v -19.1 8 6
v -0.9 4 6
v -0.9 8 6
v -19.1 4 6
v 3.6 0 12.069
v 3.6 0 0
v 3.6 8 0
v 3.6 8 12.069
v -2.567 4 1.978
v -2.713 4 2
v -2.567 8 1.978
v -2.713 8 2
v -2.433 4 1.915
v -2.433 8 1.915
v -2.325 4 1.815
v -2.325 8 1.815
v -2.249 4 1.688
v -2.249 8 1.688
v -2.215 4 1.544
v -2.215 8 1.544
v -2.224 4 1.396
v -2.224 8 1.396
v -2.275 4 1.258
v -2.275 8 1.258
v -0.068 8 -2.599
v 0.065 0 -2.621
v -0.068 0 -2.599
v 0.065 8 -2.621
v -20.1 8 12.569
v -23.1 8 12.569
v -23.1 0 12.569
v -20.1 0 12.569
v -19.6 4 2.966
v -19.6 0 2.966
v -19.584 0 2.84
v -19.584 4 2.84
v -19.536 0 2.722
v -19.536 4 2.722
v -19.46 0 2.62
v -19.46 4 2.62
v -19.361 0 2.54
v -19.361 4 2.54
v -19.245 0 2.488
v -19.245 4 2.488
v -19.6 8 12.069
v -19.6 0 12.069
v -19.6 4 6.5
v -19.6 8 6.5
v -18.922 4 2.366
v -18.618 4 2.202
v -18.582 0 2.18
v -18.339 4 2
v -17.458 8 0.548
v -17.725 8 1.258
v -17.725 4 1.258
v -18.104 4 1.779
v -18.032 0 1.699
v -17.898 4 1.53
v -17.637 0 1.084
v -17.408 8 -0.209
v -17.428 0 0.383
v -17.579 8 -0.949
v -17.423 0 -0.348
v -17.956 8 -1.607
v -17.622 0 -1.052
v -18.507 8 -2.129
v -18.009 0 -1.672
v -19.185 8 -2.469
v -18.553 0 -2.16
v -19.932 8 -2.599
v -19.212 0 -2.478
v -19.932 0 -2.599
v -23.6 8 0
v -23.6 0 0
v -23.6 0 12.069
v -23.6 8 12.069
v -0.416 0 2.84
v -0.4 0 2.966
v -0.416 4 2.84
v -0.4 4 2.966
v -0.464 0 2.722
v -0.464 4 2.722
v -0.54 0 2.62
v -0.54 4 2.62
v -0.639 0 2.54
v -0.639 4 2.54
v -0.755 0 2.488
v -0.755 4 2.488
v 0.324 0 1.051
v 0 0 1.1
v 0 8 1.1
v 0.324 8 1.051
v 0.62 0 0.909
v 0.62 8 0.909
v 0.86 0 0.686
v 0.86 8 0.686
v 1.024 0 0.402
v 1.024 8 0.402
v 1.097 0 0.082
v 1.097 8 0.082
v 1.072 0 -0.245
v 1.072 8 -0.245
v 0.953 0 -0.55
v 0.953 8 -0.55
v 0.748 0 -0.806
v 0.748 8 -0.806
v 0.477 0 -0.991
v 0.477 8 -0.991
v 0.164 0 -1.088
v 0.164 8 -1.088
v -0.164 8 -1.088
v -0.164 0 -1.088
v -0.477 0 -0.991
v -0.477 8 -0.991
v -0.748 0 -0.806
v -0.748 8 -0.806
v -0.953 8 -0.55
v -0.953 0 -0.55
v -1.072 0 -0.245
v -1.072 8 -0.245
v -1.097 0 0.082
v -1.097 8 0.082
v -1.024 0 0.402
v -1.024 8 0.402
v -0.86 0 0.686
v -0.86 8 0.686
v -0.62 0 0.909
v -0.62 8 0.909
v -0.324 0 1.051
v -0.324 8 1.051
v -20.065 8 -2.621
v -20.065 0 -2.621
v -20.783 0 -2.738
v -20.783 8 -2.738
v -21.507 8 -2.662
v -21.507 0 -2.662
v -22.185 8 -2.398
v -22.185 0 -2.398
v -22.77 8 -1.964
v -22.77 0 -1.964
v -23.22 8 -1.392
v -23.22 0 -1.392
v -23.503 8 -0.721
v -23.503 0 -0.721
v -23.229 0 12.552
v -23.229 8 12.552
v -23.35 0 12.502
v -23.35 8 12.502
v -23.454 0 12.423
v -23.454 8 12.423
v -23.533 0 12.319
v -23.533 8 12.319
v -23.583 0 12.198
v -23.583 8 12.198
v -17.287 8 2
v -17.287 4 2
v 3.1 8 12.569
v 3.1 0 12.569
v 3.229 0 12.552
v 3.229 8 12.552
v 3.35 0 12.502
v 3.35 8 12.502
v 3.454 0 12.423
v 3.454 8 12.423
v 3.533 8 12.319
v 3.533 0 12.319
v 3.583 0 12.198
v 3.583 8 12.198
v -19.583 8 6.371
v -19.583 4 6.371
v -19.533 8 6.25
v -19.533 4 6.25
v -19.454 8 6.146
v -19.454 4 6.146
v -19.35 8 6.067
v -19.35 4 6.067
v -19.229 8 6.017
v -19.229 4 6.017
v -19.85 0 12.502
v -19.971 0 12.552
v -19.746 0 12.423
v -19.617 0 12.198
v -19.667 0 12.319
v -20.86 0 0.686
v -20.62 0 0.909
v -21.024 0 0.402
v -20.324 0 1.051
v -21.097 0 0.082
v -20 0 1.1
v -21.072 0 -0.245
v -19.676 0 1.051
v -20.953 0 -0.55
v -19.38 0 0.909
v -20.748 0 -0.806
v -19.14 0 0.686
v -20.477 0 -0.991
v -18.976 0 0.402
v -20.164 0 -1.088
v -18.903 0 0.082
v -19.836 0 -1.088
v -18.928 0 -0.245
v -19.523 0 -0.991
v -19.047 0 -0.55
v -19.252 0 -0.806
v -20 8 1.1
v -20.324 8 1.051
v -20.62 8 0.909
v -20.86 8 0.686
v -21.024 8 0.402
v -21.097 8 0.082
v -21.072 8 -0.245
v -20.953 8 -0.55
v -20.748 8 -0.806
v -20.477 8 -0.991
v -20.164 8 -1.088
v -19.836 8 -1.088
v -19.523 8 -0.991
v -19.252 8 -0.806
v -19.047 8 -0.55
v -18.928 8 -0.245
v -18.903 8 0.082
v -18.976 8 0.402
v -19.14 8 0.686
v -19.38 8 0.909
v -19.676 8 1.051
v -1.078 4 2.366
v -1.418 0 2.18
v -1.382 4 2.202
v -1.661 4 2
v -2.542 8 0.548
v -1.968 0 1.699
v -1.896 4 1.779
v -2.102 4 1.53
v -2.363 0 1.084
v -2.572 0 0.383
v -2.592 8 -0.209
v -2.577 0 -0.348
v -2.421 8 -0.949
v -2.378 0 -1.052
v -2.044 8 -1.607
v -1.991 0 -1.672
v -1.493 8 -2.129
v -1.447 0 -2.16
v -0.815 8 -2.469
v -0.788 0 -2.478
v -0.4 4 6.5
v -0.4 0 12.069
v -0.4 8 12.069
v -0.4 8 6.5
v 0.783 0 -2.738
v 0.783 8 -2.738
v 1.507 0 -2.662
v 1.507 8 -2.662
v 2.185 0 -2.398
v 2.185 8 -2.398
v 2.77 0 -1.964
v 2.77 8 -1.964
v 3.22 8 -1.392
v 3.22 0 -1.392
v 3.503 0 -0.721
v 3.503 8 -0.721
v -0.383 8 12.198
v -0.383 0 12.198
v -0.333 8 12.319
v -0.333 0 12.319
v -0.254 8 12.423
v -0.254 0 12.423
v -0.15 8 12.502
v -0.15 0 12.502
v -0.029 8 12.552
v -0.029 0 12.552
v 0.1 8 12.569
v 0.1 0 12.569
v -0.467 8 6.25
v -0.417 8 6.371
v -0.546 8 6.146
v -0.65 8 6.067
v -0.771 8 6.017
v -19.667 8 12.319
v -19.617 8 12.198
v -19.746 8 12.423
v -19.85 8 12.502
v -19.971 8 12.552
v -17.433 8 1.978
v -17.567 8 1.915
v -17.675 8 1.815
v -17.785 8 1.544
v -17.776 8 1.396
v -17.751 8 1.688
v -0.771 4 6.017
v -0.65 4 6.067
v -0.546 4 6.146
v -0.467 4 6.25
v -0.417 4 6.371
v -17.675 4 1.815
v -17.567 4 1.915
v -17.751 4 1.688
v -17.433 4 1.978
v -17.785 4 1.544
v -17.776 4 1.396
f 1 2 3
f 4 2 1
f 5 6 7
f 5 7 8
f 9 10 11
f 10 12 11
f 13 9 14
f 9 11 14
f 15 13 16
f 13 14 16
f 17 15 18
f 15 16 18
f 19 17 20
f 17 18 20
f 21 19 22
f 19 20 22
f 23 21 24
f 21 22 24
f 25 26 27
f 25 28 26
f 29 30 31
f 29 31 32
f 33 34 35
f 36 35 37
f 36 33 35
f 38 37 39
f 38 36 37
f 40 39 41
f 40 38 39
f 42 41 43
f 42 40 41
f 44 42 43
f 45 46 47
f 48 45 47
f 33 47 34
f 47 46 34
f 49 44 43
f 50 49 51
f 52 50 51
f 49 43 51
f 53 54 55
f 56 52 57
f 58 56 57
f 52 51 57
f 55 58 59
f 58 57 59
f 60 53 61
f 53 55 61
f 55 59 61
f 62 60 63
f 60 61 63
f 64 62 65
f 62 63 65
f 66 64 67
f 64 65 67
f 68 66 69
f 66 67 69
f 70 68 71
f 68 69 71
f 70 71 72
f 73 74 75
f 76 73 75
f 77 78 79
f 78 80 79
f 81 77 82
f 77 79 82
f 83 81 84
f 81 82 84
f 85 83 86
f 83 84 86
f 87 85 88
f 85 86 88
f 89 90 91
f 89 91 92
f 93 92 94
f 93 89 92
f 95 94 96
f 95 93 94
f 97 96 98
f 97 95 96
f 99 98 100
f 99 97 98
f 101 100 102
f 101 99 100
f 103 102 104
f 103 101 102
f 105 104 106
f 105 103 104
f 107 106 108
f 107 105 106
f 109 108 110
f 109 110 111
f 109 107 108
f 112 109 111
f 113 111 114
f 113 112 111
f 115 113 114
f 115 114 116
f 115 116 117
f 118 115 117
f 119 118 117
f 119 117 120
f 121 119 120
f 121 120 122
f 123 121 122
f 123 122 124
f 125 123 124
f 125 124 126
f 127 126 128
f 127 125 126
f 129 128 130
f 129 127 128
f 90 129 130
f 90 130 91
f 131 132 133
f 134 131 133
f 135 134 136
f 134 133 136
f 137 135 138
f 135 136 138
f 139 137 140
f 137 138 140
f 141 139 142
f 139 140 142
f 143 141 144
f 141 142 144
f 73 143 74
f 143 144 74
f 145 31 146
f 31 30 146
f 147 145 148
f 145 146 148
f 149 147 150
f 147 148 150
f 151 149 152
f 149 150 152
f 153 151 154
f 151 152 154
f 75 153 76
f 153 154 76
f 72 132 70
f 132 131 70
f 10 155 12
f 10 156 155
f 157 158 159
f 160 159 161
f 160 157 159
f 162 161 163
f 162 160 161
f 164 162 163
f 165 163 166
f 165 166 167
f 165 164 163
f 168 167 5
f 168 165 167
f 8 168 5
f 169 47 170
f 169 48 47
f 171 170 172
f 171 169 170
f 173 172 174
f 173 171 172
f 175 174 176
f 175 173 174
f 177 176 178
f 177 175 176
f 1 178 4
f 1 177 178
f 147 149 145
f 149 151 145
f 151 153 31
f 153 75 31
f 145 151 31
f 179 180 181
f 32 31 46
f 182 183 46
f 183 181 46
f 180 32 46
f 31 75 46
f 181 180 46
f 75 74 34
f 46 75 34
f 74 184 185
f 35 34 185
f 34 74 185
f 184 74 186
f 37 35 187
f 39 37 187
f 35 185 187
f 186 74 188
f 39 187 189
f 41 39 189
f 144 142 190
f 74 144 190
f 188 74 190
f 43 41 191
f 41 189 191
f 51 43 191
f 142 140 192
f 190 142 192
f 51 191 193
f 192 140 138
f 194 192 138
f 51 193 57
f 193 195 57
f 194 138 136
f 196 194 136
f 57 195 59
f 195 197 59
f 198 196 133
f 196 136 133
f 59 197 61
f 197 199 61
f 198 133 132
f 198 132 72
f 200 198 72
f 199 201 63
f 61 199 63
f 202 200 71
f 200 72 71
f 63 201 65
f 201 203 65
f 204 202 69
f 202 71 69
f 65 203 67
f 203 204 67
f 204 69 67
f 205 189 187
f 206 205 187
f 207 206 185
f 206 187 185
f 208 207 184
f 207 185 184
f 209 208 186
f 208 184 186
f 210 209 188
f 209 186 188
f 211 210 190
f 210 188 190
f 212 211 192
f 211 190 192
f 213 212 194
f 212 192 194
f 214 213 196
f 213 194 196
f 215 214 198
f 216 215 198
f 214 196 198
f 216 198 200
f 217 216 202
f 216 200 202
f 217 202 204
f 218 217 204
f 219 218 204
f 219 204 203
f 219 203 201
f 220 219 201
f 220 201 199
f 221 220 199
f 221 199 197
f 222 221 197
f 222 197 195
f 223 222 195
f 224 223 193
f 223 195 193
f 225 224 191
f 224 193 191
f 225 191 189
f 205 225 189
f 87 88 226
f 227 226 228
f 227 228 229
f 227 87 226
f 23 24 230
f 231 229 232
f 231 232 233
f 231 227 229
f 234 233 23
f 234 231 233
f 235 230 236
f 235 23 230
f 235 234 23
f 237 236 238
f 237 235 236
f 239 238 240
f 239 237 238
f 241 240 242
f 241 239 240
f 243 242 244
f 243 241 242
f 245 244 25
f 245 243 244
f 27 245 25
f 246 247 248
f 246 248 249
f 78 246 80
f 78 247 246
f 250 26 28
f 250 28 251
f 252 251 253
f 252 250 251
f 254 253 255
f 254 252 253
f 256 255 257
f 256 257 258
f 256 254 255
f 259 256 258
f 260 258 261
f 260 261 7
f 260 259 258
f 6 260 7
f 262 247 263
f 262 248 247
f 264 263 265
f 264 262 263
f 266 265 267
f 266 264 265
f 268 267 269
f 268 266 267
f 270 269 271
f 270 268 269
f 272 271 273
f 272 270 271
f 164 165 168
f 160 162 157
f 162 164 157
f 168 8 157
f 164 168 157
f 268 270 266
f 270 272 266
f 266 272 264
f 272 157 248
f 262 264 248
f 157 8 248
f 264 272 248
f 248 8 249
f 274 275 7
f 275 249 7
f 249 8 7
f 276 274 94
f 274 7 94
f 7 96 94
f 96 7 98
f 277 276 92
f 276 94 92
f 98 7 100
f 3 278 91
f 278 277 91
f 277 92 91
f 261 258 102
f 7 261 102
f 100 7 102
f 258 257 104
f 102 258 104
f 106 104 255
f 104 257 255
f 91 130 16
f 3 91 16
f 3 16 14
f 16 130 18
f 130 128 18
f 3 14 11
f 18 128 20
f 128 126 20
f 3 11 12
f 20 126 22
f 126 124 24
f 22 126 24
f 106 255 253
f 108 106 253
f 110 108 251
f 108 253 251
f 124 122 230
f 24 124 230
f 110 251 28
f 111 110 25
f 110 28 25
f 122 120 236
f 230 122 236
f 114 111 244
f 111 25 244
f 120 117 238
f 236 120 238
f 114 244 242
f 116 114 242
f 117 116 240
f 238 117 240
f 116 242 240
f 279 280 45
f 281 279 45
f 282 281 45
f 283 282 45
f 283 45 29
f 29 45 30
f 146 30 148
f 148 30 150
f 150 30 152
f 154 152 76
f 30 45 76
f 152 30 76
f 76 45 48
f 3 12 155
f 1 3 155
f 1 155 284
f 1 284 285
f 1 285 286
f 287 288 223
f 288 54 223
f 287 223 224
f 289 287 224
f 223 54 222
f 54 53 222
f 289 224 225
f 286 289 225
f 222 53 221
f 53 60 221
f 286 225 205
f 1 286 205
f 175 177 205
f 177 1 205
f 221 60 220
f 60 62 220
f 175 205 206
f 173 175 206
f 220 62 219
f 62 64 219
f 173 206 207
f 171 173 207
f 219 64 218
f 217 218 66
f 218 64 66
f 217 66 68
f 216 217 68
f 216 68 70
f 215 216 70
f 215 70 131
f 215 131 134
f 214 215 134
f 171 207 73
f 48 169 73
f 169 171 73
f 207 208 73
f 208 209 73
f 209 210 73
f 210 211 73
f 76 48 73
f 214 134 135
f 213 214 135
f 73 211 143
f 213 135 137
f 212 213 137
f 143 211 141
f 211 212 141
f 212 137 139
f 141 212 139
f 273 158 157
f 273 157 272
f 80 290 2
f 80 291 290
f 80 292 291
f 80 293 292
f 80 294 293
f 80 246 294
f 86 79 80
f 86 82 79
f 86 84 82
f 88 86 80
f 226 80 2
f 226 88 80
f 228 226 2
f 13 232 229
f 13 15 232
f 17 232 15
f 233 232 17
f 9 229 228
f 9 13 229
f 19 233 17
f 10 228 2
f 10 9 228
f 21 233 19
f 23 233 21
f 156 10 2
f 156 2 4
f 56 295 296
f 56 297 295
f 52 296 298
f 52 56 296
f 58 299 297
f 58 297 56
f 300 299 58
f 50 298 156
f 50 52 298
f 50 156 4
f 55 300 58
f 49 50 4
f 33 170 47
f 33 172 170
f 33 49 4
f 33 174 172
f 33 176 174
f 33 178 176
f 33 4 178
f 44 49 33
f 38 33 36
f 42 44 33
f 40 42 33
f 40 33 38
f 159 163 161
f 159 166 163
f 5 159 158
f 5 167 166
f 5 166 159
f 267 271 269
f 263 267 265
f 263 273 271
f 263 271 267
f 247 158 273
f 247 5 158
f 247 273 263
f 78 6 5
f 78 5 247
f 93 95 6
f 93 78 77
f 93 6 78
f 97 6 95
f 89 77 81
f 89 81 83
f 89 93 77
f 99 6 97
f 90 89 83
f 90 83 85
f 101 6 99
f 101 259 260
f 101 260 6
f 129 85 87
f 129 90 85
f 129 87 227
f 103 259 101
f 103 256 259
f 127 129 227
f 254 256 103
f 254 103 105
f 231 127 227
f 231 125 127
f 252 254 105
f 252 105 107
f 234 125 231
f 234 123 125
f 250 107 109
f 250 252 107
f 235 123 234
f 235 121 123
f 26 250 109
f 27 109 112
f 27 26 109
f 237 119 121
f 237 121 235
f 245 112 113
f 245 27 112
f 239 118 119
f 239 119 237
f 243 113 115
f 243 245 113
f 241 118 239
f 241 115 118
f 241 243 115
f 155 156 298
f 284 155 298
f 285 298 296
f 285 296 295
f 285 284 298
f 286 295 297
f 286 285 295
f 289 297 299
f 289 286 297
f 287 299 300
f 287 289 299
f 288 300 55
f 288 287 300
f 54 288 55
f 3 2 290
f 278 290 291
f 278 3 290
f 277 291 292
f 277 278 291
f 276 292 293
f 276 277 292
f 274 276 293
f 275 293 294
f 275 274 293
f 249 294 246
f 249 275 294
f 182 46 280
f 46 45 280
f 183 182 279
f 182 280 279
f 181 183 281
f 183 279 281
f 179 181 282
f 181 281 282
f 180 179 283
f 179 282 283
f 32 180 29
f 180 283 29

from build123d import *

# Parameters (mm, degrees)
SKETCH1_R           = 1.1
BASE_DEPTH          = 8
BOSS_EXTRUDE2_START = -4
BOSS_EXTRUDE2_DEPTH = 4
FILLET1_R           = 0.5


with BuildPart() as part:
    # Sketch1 → Base (new body)
    with BuildSketch(Plane(origin=(0, 0, 0), x_dir=(1, 0, 0), z_dir=(0, 1, 0))):
        with BuildLine():
            Line((3.6, 0), (3.6, -12.569046516))
            Line((3.6, -12.569046516), (-0.4, -12.569046516))
            Line((-0.4, -12.569046516), (-0.4, -2.569046516))
            ThreePointArc((-0.4, -2.569046516), (-2.592250079, 0.20059793), (0, 2.6))
            ThreePointArc((0, 2.6), (2.464704684, 2.220360331), (3.6, 0))
        make_face()
        with Locations(Location((0, 0, 0), (0, 0, 270))):
            Circle(SKETCH1_R, mode=Mode.SUBTRACT)
    extrude(amount=BASE_DEPTH)

    # Sketch2 → Boss-Extrude2 (add)
    with BuildSketch(Plane(origin=(0, 8, 0), x_dir=(1, 0, 0), z_dir=(0, 1, 0)).offset(BOSS_EXTRUDE2_START)):
        with BuildLine():
            ThreePointArc((-0.4, -2.569046516), (-1.069213935, -2.369975013), (-1.661324773, -2))
            Line((-1.661324773, -2), (-10, -2))
            Line((-10, -2), (-10, -6))
            Line((-10, -6), (-0.4, -6))
            Line((-0.4, -6), (-0.4, -2.569046516))
        make_face()
    extrude(amount=BOSS_EXTRUDE2_DEPTH)

    # Mirror2: part across plane


with BuildPart() as part_1:
    add(part.part)
    add(part.part.mirror(Plane.ZY.offset(10)))

    # Fillet1
    fillet1_edges = [part_1.edges().sort_by_distance(p)[0] for p in [
        (-0.4, 2, 2.569046516),
        (-1.661324773, 6, 2),
        (-0.4, 6, 6),
        (-20, 4, -2.6),
        (-19.6, 2, 2.569046516),
        (-19.6, 4, 12.569046516),
        (-19.6, 6, 6),
        (-23.6, 4, 12.569046516),
        (-18.338675227, 6, 2),
        (3.6, 4, 12.569046516),
        (-0.4, 4, 12.569046516),
        (0, 4, -2.6),
    ]]
    fillet(fillet1_edges, radius=FILLET1_R)


solid = part_1.part
